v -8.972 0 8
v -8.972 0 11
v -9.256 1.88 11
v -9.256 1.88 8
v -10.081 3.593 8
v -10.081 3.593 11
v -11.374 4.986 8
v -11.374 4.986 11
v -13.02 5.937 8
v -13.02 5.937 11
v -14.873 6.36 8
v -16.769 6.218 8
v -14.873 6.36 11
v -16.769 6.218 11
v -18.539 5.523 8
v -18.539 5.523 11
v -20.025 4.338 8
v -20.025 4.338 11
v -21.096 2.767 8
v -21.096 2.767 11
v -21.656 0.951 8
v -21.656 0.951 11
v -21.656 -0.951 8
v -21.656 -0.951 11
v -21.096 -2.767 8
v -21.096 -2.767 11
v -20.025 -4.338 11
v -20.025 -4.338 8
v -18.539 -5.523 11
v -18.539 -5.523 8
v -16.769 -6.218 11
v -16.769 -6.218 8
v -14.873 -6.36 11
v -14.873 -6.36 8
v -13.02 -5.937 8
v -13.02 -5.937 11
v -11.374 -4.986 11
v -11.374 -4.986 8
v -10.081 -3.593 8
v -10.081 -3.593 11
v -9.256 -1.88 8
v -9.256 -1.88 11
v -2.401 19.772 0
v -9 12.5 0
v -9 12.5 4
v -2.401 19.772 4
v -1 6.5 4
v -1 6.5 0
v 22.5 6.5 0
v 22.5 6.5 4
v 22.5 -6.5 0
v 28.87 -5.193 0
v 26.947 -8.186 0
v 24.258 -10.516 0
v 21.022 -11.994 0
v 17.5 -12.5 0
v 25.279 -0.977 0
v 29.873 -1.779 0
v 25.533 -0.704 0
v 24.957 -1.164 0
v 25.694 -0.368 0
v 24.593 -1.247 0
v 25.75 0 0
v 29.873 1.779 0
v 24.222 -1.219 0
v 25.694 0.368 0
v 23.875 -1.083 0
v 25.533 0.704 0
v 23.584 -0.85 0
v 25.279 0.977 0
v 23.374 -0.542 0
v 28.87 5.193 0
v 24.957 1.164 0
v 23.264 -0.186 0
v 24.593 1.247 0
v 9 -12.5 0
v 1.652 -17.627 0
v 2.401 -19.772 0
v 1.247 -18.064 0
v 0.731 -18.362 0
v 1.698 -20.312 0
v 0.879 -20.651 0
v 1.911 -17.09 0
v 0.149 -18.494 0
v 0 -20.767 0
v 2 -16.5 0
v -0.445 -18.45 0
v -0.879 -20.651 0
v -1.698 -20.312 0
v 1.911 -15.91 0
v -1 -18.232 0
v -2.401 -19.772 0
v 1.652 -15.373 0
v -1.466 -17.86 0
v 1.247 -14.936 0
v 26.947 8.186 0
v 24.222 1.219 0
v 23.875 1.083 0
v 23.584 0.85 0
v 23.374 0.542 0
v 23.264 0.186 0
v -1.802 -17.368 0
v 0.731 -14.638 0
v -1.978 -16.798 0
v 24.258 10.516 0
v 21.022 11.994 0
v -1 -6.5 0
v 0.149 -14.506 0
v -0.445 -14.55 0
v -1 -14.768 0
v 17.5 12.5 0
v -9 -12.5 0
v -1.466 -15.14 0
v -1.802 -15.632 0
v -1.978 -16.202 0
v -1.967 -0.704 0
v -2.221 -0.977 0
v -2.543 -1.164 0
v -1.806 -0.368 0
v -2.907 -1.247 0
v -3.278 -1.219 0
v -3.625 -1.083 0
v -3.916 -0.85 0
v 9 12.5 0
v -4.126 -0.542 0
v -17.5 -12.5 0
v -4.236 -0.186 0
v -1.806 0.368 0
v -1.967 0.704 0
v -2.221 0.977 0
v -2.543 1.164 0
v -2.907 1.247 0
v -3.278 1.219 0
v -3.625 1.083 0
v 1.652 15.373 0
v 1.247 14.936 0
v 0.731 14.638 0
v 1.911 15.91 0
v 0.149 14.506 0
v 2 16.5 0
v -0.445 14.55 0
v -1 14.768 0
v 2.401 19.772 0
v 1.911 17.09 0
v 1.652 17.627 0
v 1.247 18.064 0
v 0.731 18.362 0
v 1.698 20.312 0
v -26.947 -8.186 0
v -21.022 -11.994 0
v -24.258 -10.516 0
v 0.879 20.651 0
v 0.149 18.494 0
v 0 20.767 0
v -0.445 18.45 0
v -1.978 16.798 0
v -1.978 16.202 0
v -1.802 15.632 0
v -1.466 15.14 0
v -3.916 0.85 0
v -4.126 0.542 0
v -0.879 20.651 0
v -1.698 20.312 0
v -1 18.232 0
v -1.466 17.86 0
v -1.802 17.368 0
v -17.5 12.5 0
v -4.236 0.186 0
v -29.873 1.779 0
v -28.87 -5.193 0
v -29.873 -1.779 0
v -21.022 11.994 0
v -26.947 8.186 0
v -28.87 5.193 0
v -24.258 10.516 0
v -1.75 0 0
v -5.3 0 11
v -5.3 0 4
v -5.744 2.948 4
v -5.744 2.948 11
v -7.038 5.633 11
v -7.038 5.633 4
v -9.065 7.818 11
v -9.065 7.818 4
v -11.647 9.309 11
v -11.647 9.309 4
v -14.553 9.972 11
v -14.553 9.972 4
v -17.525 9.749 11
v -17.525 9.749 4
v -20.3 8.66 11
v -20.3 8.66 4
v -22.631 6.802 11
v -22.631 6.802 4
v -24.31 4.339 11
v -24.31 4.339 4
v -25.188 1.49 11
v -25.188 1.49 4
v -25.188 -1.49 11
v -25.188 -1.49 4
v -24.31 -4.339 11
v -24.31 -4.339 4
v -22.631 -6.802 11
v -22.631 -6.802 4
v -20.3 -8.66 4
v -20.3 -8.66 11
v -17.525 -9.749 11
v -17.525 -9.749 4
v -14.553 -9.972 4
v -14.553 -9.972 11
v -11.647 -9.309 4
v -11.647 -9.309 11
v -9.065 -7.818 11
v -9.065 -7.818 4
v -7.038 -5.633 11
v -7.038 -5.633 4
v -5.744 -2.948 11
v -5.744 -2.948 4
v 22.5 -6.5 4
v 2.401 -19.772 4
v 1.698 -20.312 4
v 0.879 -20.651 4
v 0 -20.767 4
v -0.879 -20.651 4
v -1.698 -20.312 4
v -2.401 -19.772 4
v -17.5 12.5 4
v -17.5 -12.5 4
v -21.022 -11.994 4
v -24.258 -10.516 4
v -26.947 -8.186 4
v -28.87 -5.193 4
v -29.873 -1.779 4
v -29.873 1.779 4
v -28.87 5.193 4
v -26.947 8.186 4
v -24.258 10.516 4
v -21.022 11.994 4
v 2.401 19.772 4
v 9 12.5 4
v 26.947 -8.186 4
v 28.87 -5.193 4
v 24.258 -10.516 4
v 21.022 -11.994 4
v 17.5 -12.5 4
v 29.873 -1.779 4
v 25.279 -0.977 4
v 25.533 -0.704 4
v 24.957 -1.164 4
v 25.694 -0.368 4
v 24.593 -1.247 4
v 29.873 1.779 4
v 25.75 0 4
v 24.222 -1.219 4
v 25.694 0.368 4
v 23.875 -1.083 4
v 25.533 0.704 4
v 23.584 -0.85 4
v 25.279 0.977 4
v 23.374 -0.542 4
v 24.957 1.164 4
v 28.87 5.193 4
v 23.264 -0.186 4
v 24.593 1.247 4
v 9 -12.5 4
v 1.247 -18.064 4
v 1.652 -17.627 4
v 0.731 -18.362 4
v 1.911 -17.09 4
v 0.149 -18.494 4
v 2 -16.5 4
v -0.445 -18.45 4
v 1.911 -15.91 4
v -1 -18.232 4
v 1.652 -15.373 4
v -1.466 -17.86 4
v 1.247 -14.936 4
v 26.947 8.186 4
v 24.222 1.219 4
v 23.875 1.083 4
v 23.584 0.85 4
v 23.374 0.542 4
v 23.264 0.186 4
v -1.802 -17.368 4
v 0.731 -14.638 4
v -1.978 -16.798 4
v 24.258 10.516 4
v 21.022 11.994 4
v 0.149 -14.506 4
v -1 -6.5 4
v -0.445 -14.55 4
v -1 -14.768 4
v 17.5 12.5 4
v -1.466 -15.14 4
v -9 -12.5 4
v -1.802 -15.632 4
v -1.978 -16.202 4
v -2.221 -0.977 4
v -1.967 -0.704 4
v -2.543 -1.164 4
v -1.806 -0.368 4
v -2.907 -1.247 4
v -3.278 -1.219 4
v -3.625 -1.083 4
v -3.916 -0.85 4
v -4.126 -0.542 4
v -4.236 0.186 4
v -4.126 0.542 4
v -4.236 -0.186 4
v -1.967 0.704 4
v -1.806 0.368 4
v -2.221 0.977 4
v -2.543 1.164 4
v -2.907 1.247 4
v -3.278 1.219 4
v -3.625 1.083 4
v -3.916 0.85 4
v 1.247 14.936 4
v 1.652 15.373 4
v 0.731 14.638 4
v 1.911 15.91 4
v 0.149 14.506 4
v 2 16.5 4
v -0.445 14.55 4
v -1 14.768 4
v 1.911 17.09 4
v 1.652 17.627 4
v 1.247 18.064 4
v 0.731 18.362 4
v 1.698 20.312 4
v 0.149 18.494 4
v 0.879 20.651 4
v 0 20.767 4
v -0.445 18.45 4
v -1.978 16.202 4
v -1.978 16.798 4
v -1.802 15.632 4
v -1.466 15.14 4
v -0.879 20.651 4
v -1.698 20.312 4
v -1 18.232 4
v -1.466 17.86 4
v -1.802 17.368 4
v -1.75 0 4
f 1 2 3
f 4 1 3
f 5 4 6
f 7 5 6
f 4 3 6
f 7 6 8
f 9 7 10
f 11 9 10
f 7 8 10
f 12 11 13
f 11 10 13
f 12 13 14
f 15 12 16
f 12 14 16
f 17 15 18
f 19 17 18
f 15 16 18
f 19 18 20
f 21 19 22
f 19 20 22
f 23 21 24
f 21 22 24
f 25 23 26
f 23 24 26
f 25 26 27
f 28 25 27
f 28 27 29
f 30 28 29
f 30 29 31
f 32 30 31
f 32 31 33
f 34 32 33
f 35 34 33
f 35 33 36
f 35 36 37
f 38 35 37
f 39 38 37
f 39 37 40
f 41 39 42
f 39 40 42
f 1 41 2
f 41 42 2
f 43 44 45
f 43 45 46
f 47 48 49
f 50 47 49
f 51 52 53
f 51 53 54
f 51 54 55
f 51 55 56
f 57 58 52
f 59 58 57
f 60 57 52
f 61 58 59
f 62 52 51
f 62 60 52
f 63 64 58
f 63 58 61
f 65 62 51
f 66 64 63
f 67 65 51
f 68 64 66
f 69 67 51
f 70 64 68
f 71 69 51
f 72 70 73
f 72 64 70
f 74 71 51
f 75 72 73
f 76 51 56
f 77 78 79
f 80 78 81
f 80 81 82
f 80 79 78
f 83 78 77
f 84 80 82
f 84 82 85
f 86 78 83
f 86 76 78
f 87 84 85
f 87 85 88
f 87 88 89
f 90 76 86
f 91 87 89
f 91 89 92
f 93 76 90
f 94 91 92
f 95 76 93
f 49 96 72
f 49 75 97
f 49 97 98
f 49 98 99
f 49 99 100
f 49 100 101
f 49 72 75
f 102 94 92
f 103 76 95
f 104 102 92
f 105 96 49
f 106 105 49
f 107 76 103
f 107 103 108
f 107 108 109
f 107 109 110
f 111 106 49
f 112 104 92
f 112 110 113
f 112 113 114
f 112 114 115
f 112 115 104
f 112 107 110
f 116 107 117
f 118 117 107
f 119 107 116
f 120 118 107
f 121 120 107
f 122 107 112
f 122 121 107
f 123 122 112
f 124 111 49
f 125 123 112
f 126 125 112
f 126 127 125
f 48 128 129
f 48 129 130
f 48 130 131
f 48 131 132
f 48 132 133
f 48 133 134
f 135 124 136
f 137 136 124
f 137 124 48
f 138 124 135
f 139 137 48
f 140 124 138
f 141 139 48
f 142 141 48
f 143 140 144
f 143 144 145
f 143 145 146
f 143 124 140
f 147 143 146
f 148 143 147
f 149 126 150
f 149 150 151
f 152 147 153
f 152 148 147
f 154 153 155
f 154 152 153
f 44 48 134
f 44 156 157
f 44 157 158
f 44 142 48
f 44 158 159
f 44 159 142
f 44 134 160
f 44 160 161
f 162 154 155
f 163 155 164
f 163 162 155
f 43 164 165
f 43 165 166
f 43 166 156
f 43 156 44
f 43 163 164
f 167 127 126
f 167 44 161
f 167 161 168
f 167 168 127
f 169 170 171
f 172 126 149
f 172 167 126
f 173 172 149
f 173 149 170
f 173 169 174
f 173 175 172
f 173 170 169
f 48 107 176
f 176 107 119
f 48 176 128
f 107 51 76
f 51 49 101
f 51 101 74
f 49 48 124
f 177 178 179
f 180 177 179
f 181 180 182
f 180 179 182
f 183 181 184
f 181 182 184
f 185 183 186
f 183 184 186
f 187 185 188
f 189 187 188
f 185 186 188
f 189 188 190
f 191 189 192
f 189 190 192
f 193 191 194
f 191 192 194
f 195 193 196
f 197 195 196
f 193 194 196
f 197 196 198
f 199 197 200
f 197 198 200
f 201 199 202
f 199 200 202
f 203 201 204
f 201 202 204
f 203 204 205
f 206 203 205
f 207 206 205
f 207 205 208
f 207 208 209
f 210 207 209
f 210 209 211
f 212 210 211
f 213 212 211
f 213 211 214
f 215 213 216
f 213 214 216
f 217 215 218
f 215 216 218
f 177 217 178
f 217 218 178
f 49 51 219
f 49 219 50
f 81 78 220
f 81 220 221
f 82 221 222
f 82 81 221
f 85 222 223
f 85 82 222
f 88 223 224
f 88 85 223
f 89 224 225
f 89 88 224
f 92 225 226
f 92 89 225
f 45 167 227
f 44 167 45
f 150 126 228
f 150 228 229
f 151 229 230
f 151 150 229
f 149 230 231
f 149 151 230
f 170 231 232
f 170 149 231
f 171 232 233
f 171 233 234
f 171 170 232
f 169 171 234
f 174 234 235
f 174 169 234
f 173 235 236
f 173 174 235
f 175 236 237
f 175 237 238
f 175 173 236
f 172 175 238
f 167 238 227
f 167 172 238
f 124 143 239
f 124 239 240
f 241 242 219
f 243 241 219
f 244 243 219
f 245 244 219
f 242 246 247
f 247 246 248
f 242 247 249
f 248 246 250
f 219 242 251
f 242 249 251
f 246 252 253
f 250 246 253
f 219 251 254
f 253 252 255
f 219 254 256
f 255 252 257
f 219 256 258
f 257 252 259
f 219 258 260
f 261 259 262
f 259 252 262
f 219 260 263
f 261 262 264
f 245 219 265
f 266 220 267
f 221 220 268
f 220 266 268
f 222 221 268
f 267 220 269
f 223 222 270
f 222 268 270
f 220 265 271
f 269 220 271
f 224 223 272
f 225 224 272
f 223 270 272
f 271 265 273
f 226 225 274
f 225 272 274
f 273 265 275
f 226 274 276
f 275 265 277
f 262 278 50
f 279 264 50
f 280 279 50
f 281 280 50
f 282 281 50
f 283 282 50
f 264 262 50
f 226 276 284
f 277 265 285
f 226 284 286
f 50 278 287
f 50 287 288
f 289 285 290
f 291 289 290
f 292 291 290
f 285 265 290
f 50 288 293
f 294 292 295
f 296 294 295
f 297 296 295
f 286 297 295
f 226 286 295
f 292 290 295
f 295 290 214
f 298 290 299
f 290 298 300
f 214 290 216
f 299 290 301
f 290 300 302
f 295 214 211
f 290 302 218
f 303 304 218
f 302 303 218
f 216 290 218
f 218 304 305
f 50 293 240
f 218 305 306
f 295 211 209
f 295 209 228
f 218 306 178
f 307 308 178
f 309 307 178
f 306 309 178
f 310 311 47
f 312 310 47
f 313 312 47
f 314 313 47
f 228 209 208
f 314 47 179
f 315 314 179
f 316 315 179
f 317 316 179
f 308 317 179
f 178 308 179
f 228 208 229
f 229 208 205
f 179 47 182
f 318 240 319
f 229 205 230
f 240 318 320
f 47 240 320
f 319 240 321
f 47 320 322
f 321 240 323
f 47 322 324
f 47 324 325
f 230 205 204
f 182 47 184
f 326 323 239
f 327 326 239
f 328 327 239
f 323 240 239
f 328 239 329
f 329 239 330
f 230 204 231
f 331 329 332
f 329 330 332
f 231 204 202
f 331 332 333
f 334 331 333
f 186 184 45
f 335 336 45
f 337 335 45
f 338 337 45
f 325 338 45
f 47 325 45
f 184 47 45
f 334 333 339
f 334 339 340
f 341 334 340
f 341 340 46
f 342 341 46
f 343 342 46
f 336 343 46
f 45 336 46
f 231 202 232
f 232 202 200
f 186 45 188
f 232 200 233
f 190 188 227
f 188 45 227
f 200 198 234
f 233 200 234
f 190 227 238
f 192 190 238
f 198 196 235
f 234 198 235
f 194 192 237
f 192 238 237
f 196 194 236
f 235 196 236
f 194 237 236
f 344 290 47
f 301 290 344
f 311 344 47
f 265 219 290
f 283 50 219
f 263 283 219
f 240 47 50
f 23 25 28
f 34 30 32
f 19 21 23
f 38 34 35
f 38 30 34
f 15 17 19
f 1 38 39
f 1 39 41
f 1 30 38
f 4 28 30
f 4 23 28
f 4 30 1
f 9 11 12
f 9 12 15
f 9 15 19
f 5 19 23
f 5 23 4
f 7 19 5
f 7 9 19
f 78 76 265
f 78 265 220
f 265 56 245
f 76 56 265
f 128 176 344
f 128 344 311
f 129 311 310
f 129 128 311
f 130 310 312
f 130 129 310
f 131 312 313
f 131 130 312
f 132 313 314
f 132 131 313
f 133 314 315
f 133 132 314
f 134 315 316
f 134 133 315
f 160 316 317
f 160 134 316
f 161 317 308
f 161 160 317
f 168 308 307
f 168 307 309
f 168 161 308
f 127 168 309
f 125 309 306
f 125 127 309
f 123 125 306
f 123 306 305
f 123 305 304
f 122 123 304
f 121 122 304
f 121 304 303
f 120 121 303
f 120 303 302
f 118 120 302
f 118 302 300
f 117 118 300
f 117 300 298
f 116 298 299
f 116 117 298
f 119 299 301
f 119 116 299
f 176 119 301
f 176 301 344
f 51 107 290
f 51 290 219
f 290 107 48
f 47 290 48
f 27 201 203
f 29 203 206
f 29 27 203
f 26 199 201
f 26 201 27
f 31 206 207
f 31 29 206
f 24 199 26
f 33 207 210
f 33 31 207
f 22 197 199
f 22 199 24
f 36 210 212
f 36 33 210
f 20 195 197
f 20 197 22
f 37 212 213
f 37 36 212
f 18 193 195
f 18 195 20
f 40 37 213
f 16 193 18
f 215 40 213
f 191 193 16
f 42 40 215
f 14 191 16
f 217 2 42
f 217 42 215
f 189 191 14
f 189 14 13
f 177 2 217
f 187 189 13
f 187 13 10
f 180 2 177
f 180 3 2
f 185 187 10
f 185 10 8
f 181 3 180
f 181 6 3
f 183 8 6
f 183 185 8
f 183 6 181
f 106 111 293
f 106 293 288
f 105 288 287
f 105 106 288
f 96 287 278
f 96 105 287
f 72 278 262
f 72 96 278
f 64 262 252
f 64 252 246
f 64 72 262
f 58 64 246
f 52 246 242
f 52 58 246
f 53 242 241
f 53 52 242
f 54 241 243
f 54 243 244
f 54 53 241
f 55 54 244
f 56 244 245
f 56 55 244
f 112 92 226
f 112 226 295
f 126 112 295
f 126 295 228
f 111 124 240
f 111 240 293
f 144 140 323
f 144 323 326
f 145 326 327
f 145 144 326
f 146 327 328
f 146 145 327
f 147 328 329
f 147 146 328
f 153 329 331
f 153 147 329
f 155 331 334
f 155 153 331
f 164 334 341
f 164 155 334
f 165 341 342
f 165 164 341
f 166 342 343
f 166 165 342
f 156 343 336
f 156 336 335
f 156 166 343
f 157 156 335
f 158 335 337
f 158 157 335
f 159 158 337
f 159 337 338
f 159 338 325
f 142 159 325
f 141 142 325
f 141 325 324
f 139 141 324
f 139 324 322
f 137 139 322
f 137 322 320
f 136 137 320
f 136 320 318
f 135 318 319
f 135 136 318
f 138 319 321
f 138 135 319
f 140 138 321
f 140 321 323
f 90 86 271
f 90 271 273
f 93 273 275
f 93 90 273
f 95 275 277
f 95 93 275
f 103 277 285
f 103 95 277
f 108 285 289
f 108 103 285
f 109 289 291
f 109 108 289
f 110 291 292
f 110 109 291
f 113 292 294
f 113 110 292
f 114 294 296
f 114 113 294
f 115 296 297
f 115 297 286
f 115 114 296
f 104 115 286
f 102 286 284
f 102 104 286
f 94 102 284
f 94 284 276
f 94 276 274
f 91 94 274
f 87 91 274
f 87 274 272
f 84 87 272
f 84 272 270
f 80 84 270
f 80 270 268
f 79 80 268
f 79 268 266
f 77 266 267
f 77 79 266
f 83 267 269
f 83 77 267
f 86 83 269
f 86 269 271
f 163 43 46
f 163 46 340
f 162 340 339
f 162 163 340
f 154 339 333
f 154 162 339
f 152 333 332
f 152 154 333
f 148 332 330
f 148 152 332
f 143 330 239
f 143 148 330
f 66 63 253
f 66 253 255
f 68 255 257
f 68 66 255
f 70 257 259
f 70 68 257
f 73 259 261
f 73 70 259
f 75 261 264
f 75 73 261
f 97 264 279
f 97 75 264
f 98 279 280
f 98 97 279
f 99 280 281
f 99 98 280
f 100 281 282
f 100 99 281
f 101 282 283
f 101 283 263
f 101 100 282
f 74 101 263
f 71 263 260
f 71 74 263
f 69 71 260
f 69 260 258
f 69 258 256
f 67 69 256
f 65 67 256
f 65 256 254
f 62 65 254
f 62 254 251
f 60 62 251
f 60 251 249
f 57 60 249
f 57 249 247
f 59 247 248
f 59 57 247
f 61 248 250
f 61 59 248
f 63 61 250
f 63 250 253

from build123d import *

# Parameters (mm, degrees)
SKETCH1_R           = 2
SKETCH1_R_2         = 1.25
SKETCH1_W           = 23.5
SKETCH1_H           = 13
BOSS_EXTRUDE1_DEPTH = 4
SKETCH3_R           = 10
BOSS_EXTRUDE2_DEPTH = 7
SKETCH4_R           = 6.377506195
CUT_EXTRUDE1_DEPTH  = 3


with BuildPart() as part:
    # Sketch1 → Boss-Extrude1 (new body)
    with BuildSketch(Plane.XY):
        with BuildLine():
            Line((-9, 12.5), (-2.401010284, 19.772380391))
            ThreePointArc((-2.401010284, 19.772380391), (0, 20.766911414), (2.401010284, 19.772380391))
            Line((2.401010284, 19.772380391), (9, 12.5))
            Line((9, 12.5), (17.5, 12.5))
            ThreePointArc((17.5, 12.5), (30, 0), (17.5, -12.5))
            Line((17.5, -12.5), (9, -12.5))
            Line((9, -12.5), (2.401010284, -19.772380391))
            ThreePointArc((2.401010284, -19.772380391), (0, -20.766911414), (-2.401010284, -19.772380391))
            Line((-2.401010284, -19.772380391), (-9, -12.5))
            Line((-9, -12.5), (-17.5, -12.5))
            ThreePointArc((-17.5, -12.5), (-30, 0), (-17.5, 12.5))
            Line((-17.5, 12.5), (-9, 12.5))
        make_face()
        with Locations((0, 16.5)):
            Circle(SKETCH1_R, mode=Mode.SUBTRACT)
        with Locations((0, -16.5)):
            Circle(SKETCH1_R, mode=Mode.SUBTRACT)
        with Locations((-3, 0)):
            Circle(SKETCH1_R_2, mode=Mode.SUBTRACT)
        with Locations((24.5, 0)):
            Circle(SKETCH1_R_2, mode=Mode.SUBTRACT)
        with Locations((10.75, 0)):
            Rectangle(SKETCH1_W, SKETCH1_H, mode=Mode.SUBTRACT)
    extrude(amount=BOSS_EXTRUDE1_DEPTH)

    # Sketch3 → Boss-Extrude2 (add)
    with BuildSketch(Plane.XY.offset(4)):
        with Locations((-15.3, 0)):
            Circle(SKETCH3_R)
    extrude(amount=BOSS_EXTRUDE2_DEPTH)

    # Sketch4 → Cut-Extrude1 (cut)
    with BuildSketch(Plane.XY.offset(11)):
        with Locations((-15.35, 0)):
            Circle(SKETCH4_R)
    extrude(amount=-CUT_EXTRUDE1_DEPTH, mode=Mode.SUBTRACT)


solid = part.part
